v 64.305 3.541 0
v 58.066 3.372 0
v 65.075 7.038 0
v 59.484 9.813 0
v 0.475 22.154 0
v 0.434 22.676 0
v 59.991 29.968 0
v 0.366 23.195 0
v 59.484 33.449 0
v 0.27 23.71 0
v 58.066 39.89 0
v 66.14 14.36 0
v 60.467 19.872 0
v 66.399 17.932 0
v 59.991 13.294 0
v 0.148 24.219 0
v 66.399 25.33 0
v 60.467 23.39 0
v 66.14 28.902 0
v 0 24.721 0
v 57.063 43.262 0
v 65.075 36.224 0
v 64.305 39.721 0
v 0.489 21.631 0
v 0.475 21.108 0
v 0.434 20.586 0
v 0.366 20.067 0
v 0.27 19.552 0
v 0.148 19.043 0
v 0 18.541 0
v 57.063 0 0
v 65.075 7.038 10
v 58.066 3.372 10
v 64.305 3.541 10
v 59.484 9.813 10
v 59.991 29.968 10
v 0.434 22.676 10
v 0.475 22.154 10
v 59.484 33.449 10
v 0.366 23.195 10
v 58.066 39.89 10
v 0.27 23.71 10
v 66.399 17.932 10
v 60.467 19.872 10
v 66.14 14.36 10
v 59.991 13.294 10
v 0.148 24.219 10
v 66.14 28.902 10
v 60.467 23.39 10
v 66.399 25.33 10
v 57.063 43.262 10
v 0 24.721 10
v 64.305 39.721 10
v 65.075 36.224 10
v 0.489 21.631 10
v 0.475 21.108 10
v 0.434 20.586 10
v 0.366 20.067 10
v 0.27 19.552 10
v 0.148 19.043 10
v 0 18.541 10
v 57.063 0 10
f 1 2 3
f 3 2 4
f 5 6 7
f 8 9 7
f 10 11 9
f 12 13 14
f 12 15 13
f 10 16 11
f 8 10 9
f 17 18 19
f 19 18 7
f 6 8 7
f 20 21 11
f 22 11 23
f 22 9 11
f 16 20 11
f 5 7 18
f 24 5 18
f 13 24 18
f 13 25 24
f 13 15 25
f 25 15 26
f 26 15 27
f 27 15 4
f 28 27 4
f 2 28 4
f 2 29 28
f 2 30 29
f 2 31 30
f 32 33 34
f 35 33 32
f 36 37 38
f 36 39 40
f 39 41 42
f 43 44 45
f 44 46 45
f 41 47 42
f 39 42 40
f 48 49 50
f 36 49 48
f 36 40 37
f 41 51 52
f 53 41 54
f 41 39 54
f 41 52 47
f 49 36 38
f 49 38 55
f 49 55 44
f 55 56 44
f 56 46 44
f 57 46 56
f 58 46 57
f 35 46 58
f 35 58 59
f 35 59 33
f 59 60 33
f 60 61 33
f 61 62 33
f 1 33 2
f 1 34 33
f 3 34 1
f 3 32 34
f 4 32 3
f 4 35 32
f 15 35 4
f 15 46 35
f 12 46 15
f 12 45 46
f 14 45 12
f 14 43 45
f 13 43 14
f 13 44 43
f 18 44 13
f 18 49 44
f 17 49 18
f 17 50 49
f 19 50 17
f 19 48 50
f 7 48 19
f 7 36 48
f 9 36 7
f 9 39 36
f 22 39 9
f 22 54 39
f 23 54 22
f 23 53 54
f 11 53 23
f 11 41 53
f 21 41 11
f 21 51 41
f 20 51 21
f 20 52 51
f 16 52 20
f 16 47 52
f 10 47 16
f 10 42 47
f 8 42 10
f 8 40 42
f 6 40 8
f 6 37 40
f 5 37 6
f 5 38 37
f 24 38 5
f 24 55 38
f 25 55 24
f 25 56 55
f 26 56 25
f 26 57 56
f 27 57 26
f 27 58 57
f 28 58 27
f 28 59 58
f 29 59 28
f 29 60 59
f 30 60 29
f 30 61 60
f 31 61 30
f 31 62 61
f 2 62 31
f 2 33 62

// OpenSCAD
$fn = 32;

// ----------------------------------------------------------------------
// Gear sector: 4 teeth on 36 degrees
// ----------------------------------------------------------------------

// --- parameters (mm) ---
sector_angle = 36;        // sector angle, degrees
root_r = 70;              // root circle radius
tooth_h = 6;              // tooth height over the root circle
teeth = 4;                // number of teeth on the sector
hub_r = 10;               // hub bore radius
plate_t = 10;             // sector thickness, Z
arc_step = 3;             // sampling step of the root/hub arcs, degrees

tip_r = root_r + tooth_h;  // tip circle radius

profile = [[57.063, 0], [58.066, 3.372], [64.305, 3.541], [65.075, 7.038], [59.484, 9.813], [59.991, 13.294], [66.14, 14.36], [66.399, 17.932], [60.467, 19.872], [60.467, 23.39], [66.399, 25.33], [66.14, 28.902], [59.991, 29.968], [59.484, 33.449], [65.075, 36.224], [64.305, 39.721], [58.066, 39.89], [57.063, 43.262], [0, 24.721], [0.148, 24.219], [0.27, 23.71], [0.366, 23.195], [0.434, 22.676], [0.475, 22.154], [0.489, 21.631], [0.475, 21.108], [0.434, 20.586], [0.366, 20.067], [0.27, 19.552], [0.148, 19.043], [0, 18.541]];  // primary outline, 31 points, counter clockwise

// --- the one profile operation ---
linear_extrude(height = plate_t) polygon(points = profile);
